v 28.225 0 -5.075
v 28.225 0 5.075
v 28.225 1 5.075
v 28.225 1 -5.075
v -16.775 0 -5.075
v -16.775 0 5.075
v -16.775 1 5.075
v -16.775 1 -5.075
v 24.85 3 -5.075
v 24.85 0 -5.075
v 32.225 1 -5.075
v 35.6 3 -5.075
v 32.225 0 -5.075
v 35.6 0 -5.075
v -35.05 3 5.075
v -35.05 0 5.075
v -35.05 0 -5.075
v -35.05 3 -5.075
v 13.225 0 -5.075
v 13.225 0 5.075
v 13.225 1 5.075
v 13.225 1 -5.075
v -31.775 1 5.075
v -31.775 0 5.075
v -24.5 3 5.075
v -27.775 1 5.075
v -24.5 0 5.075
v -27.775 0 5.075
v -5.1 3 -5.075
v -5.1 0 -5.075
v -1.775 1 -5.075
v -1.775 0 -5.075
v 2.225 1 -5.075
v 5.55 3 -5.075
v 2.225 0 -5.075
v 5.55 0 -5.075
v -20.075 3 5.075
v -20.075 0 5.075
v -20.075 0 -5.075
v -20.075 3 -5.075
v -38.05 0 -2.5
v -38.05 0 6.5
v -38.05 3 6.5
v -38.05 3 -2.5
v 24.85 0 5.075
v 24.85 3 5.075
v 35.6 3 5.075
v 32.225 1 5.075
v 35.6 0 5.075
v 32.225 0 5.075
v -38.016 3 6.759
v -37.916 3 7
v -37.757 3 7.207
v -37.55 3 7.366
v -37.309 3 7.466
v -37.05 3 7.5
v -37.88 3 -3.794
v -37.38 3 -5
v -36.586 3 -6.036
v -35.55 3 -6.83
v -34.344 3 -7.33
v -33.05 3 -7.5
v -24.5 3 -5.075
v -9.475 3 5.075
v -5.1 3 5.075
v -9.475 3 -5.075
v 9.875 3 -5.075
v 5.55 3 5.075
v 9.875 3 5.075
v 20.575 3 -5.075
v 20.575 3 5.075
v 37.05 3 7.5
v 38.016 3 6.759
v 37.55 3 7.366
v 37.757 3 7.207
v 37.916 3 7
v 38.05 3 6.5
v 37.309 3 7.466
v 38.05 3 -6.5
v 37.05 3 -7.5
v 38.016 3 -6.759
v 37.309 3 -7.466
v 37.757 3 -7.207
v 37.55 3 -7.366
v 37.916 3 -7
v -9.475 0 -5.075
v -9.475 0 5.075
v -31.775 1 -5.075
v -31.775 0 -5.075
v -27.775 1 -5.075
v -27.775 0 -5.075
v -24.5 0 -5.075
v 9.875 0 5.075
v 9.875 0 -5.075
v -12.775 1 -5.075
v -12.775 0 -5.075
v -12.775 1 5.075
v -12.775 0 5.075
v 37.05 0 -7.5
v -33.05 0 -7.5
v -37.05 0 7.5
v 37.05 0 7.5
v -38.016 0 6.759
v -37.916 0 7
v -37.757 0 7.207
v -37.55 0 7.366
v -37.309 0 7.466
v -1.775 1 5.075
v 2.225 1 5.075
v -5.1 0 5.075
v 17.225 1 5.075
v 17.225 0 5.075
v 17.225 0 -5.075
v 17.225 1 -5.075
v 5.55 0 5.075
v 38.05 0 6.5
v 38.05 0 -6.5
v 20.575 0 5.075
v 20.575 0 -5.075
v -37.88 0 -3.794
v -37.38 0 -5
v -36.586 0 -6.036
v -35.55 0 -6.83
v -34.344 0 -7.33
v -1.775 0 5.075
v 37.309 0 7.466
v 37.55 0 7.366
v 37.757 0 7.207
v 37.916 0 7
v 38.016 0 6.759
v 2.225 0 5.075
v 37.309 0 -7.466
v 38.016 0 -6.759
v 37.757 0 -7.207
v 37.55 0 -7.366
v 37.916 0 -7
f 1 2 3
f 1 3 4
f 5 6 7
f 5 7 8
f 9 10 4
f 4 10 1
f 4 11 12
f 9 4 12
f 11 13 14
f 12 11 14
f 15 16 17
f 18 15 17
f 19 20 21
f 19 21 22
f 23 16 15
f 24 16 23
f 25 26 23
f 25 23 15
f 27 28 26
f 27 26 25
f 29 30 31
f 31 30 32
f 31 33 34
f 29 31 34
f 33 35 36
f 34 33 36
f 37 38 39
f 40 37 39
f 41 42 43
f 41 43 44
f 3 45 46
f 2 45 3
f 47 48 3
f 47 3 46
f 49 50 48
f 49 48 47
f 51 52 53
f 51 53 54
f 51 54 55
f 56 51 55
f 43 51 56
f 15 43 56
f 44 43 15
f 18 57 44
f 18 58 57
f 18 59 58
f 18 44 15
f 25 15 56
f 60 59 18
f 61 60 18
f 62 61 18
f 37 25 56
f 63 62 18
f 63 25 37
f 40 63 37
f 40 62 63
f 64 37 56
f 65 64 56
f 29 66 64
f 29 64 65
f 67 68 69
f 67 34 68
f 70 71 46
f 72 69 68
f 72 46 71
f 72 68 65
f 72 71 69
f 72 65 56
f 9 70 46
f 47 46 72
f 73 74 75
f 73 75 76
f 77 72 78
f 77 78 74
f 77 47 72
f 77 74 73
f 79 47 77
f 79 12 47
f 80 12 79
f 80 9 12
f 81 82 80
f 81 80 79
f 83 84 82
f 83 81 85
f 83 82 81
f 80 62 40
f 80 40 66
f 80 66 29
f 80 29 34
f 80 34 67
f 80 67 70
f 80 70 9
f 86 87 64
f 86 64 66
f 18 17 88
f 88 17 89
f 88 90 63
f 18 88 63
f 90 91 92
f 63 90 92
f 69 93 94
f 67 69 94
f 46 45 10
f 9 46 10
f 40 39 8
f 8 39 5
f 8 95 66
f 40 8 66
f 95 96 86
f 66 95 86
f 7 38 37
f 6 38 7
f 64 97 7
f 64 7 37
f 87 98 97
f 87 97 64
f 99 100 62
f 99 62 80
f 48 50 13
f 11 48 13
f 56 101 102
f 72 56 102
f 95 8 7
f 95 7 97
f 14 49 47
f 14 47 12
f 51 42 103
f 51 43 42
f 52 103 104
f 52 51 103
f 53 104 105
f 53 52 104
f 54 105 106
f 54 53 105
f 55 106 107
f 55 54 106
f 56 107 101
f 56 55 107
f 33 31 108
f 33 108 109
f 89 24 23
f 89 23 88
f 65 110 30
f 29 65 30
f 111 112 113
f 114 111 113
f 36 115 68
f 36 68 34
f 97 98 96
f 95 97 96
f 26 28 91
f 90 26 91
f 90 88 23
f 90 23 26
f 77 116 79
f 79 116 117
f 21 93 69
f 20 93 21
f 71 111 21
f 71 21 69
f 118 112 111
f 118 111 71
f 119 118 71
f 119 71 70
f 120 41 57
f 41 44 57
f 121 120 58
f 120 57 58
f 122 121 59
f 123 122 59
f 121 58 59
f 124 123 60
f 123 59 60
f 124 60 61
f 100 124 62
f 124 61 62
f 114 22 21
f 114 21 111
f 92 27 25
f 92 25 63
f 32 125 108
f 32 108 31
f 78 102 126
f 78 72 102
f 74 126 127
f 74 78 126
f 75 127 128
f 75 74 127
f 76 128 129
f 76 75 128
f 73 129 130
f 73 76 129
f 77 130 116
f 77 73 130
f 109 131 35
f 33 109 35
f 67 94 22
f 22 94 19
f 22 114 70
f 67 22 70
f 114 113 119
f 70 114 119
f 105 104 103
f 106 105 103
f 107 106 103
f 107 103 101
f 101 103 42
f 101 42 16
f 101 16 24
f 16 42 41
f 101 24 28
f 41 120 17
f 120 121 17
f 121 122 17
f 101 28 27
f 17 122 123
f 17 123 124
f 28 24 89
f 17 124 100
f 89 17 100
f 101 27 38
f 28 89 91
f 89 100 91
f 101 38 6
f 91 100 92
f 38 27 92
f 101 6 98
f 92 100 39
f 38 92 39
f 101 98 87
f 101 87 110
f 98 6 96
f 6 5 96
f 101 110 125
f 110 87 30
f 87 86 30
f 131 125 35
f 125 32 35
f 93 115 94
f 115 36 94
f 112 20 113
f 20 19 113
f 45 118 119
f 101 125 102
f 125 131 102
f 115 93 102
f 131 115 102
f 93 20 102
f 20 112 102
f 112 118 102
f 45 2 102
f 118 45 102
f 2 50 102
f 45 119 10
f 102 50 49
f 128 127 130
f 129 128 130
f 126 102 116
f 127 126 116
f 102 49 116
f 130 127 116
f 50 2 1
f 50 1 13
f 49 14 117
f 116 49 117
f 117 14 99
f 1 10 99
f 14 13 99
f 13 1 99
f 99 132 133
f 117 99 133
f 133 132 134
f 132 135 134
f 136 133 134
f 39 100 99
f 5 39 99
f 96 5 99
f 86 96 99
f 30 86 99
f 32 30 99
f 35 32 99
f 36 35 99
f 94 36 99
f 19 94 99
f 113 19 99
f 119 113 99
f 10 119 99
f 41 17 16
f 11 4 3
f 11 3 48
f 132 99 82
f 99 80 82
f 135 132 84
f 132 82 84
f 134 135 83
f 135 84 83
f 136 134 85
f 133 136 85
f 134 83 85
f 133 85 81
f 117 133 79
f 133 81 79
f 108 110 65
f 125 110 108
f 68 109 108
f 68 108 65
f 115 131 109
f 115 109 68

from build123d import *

# Parameters (mm, degrees)
SKETCH1_W           = 76.1
SKETCH1_H           = 15
BOSS_EXTRUDE1_DEPTH = 3
SKETCH1_3_W         = 4
SKETCH1_3_H         = 10.15
BOSS_EXTRUDE2_DEPTH = 1
FILLET1_R           = 5
FILLET2_R           = 1


with BuildPart() as part:
    # Sketch1 → Boss-Extrude1 (new body)
    with BuildSketch(Plane(origin=(0, 0, 0), x_dir=(1, 0, 0), z_dir=(0, 1, 0))):
        Rectangle(SKETCH1_W, SKETCH1_H)
        Polygon((-35.05, 5.075), (-31.775, 5.075), (-27.775, 5.075), (-24.5, 5.075), (-24.5, -5.075), (-27.775, -5.075), (-31.775, -5.075), (-35.05, -5.075), align=None, mode=Mode.SUBTRACT)
        Polygon((-20.075, 5.075), (-16.775, 5.075), (-12.775, 5.075), (-9.475, 5.075), (-9.475, -5.075), (-12.775, -5.075), (-16.775, -5.075), (-20.075, -5.075), align=None, mode=Mode.SUBTRACT)
        Polygon((-5.1, 5.075), (-1.775, 5.075), (2.225, 5.075), (5.55, 5.075), (5.55, -5.075), (2.225, -5.075), (-1.775, -5.075), (-5.1, -5.075), align=None, mode=Mode.SUBTRACT)
        Polygon((9.875, 5.075), (13.225, 5.075), (17.225, 5.075), (20.575, 5.075), (20.575, -5.075), (17.225, -5.075), (13.225, -5.075), (9.875, -5.075), align=None, mode=Mode.SUBTRACT)
        Polygon((24.85, 5.075), (28.225, 5.075), (32.225, 5.075), (35.6, 5.075), (35.6, -5.075), (32.225, -5.075), (28.225, -5.075), (24.85, -5.075), align=None, mode=Mode.SUBTRACT)
    extrude(amount=BOSS_EXTRUDE1_DEPTH)

    # Sketch1<3> → Boss-Extrude2 (add)
    with BuildSketch(Plane(origin=(0, 0, 0), x_dir=(1, 0, 0), z_dir=(0, 1, 0))):
        with Locations((-29.775, 0)):
            Rectangle(SKETCH1_3_W, SKETCH1_3_H)
        with Locations((-14.775, 0)):
            Rectangle(SKETCH1_3_W, SKETCH1_3_H)
        with Locations((0.225, 0)):
            Rectangle(SKETCH1_3_W, SKETCH1_3_H)
        with Locations((15.225, 0)):
            Rectangle(SKETCH1_3_W, SKETCH1_3_H)
        with Locations((30.225, 0)):
            Rectangle(SKETCH1_3_W, SKETCH1_3_H)
    extrude(amount=BOSS_EXTRUDE2_DEPTH)

    # Fillet1
    fillet1_edges = [part.edges().sort_by_distance(p)[0] for p in [
        (-38.05, 1.5, -7.5),
    ]]
    fillet(fillet1_edges, radius=FILLET1_R)

    # Fillet2
    fillet2_edges = [part.edges().sort_by_distance(p)[0] for p in [
        (38.05, 1.5, -7.5),
        (38.05, 1.5, 7.5),
        (-38.05, 1.5, 7.5),
    ]]
    fillet(fillet2_edges, radius=FILLET2_R)


solid = part.part
